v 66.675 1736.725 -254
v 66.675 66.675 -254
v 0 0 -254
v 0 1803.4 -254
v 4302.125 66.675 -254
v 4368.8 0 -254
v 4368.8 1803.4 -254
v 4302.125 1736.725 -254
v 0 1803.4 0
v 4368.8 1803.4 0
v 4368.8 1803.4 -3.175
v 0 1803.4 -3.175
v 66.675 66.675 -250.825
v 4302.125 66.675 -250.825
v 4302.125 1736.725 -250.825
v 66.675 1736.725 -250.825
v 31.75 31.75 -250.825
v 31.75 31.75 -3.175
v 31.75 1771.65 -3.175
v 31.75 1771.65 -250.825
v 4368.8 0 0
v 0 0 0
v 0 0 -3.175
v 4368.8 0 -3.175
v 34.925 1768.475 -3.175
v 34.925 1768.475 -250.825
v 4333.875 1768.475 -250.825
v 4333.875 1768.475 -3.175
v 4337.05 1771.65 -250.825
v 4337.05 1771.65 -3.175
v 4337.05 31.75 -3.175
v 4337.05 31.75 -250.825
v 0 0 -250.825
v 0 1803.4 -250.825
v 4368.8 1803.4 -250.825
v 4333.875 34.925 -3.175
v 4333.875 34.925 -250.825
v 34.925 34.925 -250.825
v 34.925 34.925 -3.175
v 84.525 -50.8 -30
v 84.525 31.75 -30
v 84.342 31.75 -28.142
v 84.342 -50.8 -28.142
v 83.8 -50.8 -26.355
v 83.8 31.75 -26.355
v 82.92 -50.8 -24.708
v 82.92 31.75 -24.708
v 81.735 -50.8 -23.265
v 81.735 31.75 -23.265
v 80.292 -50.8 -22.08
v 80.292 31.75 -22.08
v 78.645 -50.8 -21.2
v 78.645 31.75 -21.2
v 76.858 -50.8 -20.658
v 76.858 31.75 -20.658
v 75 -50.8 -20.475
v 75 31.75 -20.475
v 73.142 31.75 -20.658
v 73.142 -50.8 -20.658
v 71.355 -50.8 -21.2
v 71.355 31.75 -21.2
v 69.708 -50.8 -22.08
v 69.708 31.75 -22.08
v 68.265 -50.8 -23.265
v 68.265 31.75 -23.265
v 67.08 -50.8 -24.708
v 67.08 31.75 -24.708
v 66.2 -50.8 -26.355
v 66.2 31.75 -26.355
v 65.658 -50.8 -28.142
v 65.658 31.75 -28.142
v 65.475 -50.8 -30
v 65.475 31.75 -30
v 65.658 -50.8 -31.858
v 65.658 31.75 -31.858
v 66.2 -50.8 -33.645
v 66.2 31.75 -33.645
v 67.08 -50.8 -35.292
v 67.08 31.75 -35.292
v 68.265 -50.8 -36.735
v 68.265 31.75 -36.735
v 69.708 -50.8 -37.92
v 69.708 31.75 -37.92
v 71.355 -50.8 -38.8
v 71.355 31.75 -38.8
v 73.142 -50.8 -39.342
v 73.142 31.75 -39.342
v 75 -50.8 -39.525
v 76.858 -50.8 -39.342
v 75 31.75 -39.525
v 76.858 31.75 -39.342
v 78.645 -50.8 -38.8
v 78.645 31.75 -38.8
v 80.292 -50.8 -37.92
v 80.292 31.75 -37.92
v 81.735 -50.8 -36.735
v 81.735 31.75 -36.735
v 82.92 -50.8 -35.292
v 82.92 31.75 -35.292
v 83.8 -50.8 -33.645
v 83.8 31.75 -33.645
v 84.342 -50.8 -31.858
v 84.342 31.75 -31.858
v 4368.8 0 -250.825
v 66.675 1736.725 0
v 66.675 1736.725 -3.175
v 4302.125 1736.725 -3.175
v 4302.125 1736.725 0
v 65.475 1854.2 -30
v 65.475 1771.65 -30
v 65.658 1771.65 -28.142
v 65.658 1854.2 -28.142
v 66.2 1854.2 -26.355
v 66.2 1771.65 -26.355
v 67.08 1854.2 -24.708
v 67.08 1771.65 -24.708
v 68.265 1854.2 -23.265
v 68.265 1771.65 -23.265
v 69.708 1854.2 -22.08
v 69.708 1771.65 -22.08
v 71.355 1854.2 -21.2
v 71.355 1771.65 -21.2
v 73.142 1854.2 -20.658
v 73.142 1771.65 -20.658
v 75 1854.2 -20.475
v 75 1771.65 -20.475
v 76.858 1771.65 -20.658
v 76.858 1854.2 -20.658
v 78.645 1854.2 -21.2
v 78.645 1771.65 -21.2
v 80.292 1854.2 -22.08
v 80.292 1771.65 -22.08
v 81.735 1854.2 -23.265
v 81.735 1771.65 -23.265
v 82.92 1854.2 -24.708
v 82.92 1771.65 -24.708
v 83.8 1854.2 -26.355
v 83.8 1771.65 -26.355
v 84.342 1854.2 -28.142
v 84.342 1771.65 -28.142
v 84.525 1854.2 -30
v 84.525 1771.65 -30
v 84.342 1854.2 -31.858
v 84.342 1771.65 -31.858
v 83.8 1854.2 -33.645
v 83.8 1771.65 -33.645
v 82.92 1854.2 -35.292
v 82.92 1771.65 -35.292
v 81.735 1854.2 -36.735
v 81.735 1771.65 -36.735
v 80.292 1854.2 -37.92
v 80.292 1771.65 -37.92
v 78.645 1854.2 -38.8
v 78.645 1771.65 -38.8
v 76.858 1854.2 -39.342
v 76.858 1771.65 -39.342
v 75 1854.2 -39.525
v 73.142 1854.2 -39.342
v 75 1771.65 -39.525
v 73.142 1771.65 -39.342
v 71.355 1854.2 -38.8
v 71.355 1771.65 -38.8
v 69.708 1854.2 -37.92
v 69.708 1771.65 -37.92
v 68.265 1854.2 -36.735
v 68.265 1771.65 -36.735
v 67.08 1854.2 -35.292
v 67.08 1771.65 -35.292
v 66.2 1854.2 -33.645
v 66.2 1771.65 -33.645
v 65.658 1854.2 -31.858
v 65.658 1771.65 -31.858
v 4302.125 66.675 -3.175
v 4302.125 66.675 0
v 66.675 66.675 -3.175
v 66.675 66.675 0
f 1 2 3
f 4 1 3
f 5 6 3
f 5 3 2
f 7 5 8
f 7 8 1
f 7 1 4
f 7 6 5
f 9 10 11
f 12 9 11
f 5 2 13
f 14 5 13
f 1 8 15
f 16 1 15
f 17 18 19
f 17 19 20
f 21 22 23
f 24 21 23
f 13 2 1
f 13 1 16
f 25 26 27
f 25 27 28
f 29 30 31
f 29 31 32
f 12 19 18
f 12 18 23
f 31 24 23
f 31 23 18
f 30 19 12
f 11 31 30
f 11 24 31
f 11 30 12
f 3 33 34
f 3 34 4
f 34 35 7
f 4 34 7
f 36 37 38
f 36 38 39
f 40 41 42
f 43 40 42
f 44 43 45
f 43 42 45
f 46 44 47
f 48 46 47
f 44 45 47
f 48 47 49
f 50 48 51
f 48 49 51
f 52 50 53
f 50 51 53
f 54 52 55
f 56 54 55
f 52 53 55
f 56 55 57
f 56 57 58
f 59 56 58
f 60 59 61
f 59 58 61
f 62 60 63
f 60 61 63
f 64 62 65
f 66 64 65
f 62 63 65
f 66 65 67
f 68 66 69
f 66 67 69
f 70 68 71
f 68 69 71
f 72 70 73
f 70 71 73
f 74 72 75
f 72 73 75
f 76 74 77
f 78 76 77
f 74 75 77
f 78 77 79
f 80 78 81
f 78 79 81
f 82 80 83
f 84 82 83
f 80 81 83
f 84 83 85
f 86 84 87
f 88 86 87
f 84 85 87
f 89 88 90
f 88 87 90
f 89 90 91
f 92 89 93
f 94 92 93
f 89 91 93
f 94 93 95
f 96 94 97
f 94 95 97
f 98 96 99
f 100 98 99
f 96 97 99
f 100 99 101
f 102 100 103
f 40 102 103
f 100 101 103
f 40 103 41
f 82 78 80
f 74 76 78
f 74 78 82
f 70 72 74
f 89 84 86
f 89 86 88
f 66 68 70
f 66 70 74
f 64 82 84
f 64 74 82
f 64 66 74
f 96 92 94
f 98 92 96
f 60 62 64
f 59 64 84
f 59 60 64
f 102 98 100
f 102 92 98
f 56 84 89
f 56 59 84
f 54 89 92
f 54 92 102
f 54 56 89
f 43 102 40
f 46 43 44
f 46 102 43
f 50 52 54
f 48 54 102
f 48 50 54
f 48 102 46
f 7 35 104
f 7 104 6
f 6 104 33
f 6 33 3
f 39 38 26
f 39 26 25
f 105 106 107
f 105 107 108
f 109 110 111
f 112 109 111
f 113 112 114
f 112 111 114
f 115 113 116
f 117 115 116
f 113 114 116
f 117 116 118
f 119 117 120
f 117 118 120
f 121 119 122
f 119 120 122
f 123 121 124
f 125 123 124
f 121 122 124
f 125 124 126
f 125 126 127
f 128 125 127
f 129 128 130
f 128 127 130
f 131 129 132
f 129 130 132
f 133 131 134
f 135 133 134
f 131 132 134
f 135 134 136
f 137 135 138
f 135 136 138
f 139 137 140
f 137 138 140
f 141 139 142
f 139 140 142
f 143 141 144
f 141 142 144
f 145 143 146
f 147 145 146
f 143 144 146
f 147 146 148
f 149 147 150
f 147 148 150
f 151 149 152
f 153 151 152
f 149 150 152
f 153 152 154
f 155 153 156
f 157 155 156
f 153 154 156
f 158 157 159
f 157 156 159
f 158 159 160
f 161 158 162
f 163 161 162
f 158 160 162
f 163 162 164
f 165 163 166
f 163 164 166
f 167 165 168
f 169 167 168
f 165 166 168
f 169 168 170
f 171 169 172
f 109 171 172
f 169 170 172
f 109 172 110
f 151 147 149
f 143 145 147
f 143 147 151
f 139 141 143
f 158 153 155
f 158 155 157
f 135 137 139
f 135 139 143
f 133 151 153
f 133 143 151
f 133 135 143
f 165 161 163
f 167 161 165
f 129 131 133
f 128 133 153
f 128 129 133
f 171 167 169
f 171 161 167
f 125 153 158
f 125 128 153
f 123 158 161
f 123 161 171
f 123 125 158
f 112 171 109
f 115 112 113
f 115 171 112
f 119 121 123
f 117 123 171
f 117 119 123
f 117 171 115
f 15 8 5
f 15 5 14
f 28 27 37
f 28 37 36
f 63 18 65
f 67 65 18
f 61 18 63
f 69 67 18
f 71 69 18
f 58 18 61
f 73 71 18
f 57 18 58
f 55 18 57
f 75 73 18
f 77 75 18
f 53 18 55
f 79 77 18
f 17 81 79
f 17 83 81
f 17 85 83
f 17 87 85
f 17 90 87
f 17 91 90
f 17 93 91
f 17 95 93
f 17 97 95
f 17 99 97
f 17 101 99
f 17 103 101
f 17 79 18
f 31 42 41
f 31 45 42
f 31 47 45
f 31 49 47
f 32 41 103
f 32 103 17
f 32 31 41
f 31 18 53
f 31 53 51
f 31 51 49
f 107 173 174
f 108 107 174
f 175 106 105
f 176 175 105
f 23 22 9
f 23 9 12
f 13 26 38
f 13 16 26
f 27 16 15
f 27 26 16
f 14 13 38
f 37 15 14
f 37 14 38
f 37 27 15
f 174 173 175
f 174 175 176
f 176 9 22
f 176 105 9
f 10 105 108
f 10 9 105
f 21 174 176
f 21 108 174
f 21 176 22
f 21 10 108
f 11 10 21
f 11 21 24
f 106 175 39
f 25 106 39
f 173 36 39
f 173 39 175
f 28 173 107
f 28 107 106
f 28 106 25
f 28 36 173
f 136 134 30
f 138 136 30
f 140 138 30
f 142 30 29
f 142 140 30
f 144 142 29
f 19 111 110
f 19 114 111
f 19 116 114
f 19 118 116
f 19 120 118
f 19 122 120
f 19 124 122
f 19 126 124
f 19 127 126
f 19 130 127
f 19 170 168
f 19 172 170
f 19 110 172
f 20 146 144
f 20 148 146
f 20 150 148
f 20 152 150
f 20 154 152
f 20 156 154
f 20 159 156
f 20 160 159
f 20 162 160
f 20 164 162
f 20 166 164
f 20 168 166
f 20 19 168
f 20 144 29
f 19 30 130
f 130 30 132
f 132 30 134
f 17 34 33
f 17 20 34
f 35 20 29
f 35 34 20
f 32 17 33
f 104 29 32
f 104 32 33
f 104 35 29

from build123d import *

# Parameters (mm, degrees)
F3_R     = 9.525
F4_DEPTH = 82.55
F5_R     = 9.525
F6_DEPTH = 82.55


with BuildPart() as f2:
    # F2: sweep along a path in F0
    with BuildLine(Plane.XY) as f2_path:
        Line((0, 0), (4368.8, 0))
        Line((4368.8, 0), (4368.8, 1803.4))
        Line((4368.8, 1803.4), (0, 1803.4))
        Line((0, 1803.4), (0, 0))
    # F1 (on Right) → F2 (sweep)
    with BuildSketch(Plane.YZ):
        Polygon((66.675, 0), (0, 0), (0, -3.175), (31.75, -3.175), (31.75, -250.825), (0, -250.825), (0, -254), (66.675, -254), (66.675, -250.825), (34.925, -250.825), (34.925, -3.175), (66.675, -3.175), align=None)
    sweep(path=f2_path.line, transition=Transition.RIGHT)

    # F3 (on face) → F4 (join)
    with BuildSketch(Plane.XZ.offset(-31.75)):
        with Locations((75, -30)):
            Circle(F3_R)
    extrude(amount=F4_DEPTH)

    # F5 (on face) → F6 (join)
    with BuildSketch(Plane(origin=(0, 1771.65, 0), x_dir=(-1, 0, 0), z_dir=(0, 1, 0))):
        with Locations((-75, -30)):
            Circle(F5_R)
    extrude(amount=F6_DEPTH)


solid = f2.part
